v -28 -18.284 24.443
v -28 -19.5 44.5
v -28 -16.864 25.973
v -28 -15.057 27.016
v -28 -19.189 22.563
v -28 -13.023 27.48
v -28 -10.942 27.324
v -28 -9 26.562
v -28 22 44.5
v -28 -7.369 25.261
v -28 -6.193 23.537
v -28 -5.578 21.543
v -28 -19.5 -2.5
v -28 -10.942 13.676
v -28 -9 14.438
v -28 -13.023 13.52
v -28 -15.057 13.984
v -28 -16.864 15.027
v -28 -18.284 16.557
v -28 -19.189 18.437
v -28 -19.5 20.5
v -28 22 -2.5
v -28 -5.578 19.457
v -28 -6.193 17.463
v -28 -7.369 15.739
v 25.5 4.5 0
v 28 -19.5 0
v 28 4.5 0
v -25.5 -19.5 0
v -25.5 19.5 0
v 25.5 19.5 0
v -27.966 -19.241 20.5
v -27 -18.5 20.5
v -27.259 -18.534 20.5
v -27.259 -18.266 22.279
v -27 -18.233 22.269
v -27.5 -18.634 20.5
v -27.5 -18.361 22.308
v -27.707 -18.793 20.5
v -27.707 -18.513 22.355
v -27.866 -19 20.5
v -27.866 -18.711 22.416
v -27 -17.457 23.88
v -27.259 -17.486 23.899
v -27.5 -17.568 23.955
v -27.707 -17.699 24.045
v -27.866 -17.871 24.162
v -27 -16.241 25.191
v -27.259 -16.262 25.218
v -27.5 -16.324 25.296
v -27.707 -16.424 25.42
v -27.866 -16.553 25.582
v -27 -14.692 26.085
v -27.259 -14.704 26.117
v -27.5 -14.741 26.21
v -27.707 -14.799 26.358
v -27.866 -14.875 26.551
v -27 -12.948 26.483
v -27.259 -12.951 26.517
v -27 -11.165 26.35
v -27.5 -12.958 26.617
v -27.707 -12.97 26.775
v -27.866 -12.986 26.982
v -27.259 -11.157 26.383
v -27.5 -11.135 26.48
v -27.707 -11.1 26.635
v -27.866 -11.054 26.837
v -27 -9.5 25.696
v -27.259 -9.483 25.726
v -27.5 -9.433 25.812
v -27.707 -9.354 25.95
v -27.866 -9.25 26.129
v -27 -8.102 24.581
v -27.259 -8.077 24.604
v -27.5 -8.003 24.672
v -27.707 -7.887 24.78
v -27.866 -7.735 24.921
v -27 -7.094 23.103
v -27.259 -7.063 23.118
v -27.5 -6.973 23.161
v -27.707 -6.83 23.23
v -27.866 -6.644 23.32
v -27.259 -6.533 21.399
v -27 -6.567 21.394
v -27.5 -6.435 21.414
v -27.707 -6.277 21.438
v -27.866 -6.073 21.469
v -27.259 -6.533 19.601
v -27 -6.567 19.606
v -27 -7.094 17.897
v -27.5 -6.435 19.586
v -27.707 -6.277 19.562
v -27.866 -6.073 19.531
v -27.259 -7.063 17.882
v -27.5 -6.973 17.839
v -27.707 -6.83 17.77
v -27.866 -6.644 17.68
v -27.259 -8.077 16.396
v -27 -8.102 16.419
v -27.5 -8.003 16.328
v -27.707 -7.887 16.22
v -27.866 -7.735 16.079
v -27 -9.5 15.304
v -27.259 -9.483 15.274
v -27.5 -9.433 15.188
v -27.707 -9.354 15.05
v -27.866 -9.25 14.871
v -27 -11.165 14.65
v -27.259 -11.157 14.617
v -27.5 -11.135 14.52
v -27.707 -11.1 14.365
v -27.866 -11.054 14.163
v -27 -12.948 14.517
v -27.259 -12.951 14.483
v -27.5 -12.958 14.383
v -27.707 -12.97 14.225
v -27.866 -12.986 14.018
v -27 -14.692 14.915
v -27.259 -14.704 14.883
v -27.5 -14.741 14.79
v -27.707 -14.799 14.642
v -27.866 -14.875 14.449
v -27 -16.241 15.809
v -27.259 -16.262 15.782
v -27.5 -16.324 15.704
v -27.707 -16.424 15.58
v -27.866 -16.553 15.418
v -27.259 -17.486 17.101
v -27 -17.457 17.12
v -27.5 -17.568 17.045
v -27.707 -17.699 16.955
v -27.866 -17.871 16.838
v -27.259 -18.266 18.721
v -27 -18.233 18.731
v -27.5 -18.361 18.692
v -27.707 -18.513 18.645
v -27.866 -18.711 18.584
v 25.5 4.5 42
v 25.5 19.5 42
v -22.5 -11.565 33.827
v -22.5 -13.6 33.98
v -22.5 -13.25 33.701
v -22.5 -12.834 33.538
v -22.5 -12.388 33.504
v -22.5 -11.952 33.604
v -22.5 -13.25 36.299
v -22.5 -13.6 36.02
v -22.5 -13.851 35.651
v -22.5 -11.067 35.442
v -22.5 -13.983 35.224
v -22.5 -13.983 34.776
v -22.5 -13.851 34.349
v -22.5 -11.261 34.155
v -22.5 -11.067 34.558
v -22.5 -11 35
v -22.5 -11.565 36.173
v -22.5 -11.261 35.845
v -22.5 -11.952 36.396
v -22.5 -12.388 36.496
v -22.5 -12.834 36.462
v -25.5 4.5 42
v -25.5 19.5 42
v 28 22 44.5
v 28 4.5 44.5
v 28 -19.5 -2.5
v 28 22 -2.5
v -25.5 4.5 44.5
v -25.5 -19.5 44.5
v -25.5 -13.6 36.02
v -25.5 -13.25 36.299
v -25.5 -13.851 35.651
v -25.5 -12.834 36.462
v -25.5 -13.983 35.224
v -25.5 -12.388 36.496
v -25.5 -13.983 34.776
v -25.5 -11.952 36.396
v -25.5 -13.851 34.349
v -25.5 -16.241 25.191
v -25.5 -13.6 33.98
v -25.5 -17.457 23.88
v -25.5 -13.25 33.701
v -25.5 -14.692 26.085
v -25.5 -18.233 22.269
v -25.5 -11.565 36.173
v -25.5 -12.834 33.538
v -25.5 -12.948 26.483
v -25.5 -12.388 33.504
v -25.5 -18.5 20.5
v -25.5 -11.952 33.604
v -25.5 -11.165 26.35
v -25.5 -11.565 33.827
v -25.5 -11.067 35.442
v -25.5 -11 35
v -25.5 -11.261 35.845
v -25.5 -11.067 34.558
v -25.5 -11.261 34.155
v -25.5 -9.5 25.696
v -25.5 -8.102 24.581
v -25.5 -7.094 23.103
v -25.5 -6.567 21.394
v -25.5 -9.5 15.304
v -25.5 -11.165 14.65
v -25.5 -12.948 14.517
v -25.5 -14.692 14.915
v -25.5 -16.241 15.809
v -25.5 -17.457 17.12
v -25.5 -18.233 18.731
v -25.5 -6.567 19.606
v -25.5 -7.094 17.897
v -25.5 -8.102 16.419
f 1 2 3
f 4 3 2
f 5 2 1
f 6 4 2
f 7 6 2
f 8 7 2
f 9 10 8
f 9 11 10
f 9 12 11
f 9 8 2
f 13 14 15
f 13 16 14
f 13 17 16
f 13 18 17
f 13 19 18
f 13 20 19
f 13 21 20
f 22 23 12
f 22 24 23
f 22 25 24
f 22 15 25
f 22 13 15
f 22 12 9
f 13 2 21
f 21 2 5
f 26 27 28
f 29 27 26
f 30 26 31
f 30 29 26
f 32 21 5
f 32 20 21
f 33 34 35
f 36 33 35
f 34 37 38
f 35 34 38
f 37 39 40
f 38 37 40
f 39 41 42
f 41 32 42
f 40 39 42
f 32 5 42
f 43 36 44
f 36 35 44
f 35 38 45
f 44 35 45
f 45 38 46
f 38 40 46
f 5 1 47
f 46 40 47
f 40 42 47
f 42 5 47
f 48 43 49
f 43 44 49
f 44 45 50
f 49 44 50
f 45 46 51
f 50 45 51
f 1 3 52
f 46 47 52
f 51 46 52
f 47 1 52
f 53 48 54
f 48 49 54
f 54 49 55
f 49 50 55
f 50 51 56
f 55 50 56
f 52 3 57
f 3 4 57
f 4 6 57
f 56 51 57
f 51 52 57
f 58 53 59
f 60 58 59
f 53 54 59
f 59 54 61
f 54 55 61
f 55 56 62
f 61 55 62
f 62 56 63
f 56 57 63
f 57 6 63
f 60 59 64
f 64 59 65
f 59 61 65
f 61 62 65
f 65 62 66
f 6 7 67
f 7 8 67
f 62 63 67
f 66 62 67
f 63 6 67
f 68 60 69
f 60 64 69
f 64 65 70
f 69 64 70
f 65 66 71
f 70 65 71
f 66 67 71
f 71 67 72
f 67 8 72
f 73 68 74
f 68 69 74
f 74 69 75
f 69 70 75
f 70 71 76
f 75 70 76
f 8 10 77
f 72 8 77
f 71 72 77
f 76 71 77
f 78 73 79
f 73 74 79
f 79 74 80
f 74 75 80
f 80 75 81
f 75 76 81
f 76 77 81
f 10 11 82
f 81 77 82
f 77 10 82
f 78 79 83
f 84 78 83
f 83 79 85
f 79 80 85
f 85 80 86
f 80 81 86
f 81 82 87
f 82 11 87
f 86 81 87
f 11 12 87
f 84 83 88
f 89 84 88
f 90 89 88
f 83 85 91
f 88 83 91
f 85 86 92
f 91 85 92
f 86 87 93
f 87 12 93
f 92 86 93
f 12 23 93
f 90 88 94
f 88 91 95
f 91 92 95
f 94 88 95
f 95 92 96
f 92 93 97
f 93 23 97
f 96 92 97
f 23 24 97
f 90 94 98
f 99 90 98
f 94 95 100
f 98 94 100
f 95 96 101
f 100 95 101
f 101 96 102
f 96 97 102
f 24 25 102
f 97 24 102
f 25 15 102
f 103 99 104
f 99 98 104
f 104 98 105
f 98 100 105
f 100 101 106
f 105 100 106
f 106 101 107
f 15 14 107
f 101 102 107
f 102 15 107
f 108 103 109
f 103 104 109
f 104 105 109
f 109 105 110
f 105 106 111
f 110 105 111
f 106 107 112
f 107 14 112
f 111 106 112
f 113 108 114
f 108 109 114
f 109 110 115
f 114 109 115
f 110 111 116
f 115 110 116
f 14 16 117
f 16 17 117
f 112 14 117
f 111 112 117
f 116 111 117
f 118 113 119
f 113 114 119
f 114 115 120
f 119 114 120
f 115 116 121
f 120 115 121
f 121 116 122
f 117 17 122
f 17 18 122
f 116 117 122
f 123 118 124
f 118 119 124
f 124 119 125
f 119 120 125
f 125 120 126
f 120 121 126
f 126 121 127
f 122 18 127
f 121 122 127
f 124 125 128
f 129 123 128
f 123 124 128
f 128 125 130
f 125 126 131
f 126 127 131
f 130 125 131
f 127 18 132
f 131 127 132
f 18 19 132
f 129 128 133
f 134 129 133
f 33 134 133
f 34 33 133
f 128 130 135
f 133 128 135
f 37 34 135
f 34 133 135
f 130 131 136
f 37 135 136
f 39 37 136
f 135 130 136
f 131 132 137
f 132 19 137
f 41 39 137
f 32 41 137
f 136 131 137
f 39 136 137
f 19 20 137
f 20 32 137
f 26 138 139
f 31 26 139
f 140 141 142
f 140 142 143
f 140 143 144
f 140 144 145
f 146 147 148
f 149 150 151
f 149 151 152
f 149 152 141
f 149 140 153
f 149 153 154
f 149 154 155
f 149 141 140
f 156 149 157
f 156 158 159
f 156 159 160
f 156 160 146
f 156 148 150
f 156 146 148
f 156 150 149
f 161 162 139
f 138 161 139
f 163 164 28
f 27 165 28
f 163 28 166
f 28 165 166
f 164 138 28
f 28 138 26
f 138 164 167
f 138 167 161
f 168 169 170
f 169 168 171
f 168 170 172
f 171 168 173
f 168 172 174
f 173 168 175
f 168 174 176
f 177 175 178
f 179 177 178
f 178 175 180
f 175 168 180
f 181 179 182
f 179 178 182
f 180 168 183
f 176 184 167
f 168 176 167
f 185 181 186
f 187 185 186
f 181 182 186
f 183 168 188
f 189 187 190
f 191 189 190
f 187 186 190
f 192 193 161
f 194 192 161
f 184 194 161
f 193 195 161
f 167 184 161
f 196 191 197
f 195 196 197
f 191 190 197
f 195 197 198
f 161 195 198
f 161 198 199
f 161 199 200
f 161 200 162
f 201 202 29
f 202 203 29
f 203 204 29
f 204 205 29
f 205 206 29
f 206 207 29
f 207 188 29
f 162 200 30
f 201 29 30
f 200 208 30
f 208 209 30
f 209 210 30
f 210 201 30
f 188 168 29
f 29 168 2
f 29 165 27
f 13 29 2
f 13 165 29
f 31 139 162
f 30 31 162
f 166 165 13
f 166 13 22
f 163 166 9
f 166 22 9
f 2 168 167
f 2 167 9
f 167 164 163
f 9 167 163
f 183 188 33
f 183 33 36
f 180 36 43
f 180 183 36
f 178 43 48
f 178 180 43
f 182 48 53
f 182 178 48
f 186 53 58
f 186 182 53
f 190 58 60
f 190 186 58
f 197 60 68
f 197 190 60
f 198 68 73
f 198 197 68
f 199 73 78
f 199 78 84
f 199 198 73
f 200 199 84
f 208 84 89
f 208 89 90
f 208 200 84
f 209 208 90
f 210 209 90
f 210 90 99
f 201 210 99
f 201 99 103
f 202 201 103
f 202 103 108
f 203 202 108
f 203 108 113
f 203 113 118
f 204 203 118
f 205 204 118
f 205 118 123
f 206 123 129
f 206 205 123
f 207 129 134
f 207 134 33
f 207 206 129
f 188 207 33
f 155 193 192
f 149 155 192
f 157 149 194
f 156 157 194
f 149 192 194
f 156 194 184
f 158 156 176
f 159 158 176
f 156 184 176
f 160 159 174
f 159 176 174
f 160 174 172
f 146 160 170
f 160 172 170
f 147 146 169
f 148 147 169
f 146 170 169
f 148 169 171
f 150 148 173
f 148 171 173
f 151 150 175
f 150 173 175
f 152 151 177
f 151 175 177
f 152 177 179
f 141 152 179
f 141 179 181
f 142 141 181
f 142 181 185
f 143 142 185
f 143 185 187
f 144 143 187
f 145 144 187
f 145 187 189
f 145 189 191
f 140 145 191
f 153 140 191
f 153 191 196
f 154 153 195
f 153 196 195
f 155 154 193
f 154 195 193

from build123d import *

# Parameters (mm, degrees)
F0_W      = 51
F0_H      = 39
F1_DEPTH  = 2.5
F2_W      = 51
F2_H      = 42
F2_H_2    = 2.5
F3_DEPTH  = 2.5
F4_W      = 39
F4_H      = 42
F4_R      = 6
F5_DEPTH  = 2.5
F6_R      = 0.99999
F7_W      = 51
F7_H      = 15
F8_DEPTH  = 2.5
F9_W      = 15
F9_H      = 42
F10_DEPTH = 2.5
F11_R     = 1.5
F12_DEPTH = 3
F13_DEPTH = 2.5
F14_DEPTH = 2.5


# Not quite as in the source:
# - a fillet or chamfer is up to 0.001 mm smaller than in the source, because OpenCascade refuses the exact size


with BuildPart() as f1:
    # F0 (on Top) → F1 (new body)
    with BuildSketch(Plane.XY):
        Rectangle(F0_W, F0_H)
    extrude(amount=-F1_DEPTH)

    # F2 (on face) → F3 (join)
    with BuildSketch(Plane(origin=(0, 19.5, 0), x_dir=(-1, 0, 0), z_dir=(0, 1, 0))):
        with Locations((0, 21)):
            Rectangle(F2_W, F2_H)
        with Locations((0, -1.25)):
            Rectangle(F2_W, F2_H_2)
    extrude(amount=F3_DEPTH)

    # F4 (on face) → F5 (join)
    with BuildSketch(Plane(origin=(-25.5, 0, 0), x_dir=(0, -1, 0), z_dir=(-1, 0, 0))):
        with Locations((0, 21)):
            Rectangle(F4_W, F4_H)
        with Locations((12.5, 20.5)):
            Circle(F4_R, mode=Mode.SUBTRACT)
        Polygon((19.5, 0), (-19.5, 0), (-19.5, 42), (-22, 42), (-22, -2.5), (19.5, -2.5), align=None)
    extrude(amount=F5_DEPTH)

    # F6 (radius 1 in the source; OpenCascade refuses exactly that, so slightly less here)
    f6_edges = [f1.edges().sort_by_distance(p)[0] for p in [
        (-28, -6.5, 20.5),
    ]]
    fillet(f6_edges, radius=F6_R)

    # F7 (on face) → F8 (join)
    with BuildSketch(Plane.XY.offset(42)):
        Polygon((-25.5, 4.5), (-25.5, 19.5), (25.5, 19.5), (25.5, 22), (-28, 22), (-28, 4.5), align=None)
        with Locations((0, 12)):
            Rectangle(F7_W, F7_H)
    extrude(amount=F8_DEPTH)

    # F9 (on face) → F10 (join)
    with BuildSketch(Plane.YZ.offset(25.5)):
        with Locations((12, 21)):
            Rectangle(F9_W, F9_H)
        Polygon((4.5, 44.5), (4.5, 42), (19.5, 42), (19.5, 0), (4.5, 0), (4.5, -2.5), (22, -2.5), (22, 44.5), align=None)
    extrude(amount=F10_DEPTH)

    # F11 (on face) → F12 (join)
    with BuildSketch(Plane.YZ.offset(-25.5)):
        with Locations((-12.5, 35)):
            Circle(F11_R)
    extrude(amount=F12_DEPTH)

    # F13 (add): a face of the model
    f13_faces = [f1.faces().sort_by_distance(p)[0] for p in [
        (25.5, -7.5, -1.25),
    ]]
    extrude(f13_faces, amount=F13_DEPTH)

    # F14 (add): a face of the model
    f14_faces = [f1.faces().sort_by_distance(p)[0] for p in [
        (-26.75, -7.5, 42),
    ]]
    extrude(f14_faces, amount=F14_DEPTH)


solid = f1.part
